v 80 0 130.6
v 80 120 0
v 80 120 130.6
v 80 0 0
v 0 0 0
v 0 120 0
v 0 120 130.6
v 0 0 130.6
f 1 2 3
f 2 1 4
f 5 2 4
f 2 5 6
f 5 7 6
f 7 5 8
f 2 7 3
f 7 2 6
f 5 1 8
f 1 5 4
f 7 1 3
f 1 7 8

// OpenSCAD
// Architectural thermal visualization; dimensions are scaled.
color([0.8944,0,0.1056,0.75]) translate([0,0,0.00000]) cube([80.00000,120.00000,18.00000]);
color([0.9951,0,0.0049,0.75]) translate([0,0,18.00000]) cube([80.00000,120.00000,10.00000]);
color([1.0000,0,0.0000,0.75]) translate([0,0,28.00000]) cube([80.00000,120.00000,10.00000]);
color([0.9637,0,0.0363,0.75]) translate([0,0,38.00000]) cube([80.00000,120.00000,1.50000]);
color([0.9326,0,0.0674,0.75]) translate([0,0,39.50000]) cube([80.00000,120.00000,3.20000]);
color([0.9039,0,0.0961,0.75]) translate([0,0,42.70000]) cube([80.00000,120.00000,1.50000]);
color([0.8753,0,0.1247,0.75]) translate([0,0,44.20000]) cube([80.00000,120.00000,3.20000]);
color([0.8485,0,0.1515,0.75]) translate([0,0,47.40000]) cube([80.00000,120.00000,1.50000]);
color([0.8218,0,0.1782,0.75]) translate([0,0,48.90000]) cube([80.00000,120.00000,3.20000]);
color([0.7969,0,0.2031,0.75]) translate([0,0,52.10000]) cube([80.00000,120.00000,1.50000]);
color([0.7720,0,0.2280,0.75]) translate([0,0,53.60000]) cube([80.00000,120.00000,3.20000]);
color([0.7483,0,0.2517,0.75]) translate([0,0,56.80000]) cube([80.00000,120.00000,1.50000]);
color([0.7247,0,0.2753,0.75]) translate([0,0,58.30000]) cube([80.00000,120.00000,3.20000]);
color([0.7019,0,0.2981,0.75]) translate([0,0,61.50000]) cube([80.00000,120.00000,1.50000]);
color([0.6791,0,0.3209,0.75]) translate([0,0,63.00000]) cube([80.00000,120.00000,3.20000]);
color([0.6571,0,0.3429,0.75]) translate([0,0,66.20000]) cube([80.00000,120.00000,1.50000]);
color([0.6351,0,0.3649,0.75]) translate([0,0,67.70000]) cube([80.00000,120.00000,3.20000]);
color([0.6137,0,0.3863,0.75]) translate([0,0,70.90000]) cube([80.00000,120.00000,1.50000]);
color([0.5923,0,0.4077,0.75]) translate([0,0,72.40000]) cube([80.00000,120.00000,3.20000]);
color([0.5103,0,0.4897,0.75]) translate([0,0,75.60000]) cube([80.00000,120.00000,5.00000]);
color([0.4287,0,0.5713,0.75]) translate([0,0,80.60000]) cube([80.00000,120.00000,50.00000]);
